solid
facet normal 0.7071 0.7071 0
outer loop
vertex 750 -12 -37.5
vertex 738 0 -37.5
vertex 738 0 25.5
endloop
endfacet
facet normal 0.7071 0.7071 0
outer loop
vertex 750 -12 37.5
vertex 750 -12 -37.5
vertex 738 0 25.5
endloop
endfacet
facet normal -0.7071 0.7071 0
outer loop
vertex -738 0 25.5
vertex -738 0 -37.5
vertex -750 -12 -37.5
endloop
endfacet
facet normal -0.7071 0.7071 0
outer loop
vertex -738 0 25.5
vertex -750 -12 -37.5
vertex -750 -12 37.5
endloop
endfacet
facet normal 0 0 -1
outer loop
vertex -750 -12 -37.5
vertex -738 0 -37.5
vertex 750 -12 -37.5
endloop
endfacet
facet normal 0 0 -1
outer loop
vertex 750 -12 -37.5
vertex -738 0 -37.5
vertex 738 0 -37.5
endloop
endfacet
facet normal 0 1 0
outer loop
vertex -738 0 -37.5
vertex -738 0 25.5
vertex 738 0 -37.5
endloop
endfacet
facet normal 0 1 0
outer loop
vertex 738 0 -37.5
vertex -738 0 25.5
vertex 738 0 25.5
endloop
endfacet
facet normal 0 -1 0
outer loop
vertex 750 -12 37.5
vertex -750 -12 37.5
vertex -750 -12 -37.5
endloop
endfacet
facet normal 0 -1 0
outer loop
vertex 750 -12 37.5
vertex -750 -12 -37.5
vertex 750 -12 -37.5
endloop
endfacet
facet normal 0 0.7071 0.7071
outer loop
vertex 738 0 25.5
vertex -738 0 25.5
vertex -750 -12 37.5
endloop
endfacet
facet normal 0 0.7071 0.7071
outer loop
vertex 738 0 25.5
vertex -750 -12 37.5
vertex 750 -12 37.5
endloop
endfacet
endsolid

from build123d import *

# Parameters (mm, degrees)
F0_W     = 1500
F0_H     = 75
F1_DEPTH = 12
F2_SIZE  = 11.99999


# Not quite as in the source:
# - a fillet or chamfer is up to 0.001 mm smaller than in the source, because OpenCascade refuses the exact size


with BuildPart() as f1:
    # F0 (on Front) → F1 (new body)
    with BuildSketch(Plane.XZ):
        Rectangle(F0_W, F0_H)
    extrude(amount=F1_DEPTH)

    # F2 (size 12 in the source; OpenCascade refuses exactly that, so slightly less here)
    f2_edges = [f1.edges().sort_by_distance(p)[0] for p in [
        (0, 0, 37.5),
        (750, 0, 0),
        (-750, 0, 0),
    ]]
    chamfer(f2_edges, length=F2_SIZE)


solid = f1.part
